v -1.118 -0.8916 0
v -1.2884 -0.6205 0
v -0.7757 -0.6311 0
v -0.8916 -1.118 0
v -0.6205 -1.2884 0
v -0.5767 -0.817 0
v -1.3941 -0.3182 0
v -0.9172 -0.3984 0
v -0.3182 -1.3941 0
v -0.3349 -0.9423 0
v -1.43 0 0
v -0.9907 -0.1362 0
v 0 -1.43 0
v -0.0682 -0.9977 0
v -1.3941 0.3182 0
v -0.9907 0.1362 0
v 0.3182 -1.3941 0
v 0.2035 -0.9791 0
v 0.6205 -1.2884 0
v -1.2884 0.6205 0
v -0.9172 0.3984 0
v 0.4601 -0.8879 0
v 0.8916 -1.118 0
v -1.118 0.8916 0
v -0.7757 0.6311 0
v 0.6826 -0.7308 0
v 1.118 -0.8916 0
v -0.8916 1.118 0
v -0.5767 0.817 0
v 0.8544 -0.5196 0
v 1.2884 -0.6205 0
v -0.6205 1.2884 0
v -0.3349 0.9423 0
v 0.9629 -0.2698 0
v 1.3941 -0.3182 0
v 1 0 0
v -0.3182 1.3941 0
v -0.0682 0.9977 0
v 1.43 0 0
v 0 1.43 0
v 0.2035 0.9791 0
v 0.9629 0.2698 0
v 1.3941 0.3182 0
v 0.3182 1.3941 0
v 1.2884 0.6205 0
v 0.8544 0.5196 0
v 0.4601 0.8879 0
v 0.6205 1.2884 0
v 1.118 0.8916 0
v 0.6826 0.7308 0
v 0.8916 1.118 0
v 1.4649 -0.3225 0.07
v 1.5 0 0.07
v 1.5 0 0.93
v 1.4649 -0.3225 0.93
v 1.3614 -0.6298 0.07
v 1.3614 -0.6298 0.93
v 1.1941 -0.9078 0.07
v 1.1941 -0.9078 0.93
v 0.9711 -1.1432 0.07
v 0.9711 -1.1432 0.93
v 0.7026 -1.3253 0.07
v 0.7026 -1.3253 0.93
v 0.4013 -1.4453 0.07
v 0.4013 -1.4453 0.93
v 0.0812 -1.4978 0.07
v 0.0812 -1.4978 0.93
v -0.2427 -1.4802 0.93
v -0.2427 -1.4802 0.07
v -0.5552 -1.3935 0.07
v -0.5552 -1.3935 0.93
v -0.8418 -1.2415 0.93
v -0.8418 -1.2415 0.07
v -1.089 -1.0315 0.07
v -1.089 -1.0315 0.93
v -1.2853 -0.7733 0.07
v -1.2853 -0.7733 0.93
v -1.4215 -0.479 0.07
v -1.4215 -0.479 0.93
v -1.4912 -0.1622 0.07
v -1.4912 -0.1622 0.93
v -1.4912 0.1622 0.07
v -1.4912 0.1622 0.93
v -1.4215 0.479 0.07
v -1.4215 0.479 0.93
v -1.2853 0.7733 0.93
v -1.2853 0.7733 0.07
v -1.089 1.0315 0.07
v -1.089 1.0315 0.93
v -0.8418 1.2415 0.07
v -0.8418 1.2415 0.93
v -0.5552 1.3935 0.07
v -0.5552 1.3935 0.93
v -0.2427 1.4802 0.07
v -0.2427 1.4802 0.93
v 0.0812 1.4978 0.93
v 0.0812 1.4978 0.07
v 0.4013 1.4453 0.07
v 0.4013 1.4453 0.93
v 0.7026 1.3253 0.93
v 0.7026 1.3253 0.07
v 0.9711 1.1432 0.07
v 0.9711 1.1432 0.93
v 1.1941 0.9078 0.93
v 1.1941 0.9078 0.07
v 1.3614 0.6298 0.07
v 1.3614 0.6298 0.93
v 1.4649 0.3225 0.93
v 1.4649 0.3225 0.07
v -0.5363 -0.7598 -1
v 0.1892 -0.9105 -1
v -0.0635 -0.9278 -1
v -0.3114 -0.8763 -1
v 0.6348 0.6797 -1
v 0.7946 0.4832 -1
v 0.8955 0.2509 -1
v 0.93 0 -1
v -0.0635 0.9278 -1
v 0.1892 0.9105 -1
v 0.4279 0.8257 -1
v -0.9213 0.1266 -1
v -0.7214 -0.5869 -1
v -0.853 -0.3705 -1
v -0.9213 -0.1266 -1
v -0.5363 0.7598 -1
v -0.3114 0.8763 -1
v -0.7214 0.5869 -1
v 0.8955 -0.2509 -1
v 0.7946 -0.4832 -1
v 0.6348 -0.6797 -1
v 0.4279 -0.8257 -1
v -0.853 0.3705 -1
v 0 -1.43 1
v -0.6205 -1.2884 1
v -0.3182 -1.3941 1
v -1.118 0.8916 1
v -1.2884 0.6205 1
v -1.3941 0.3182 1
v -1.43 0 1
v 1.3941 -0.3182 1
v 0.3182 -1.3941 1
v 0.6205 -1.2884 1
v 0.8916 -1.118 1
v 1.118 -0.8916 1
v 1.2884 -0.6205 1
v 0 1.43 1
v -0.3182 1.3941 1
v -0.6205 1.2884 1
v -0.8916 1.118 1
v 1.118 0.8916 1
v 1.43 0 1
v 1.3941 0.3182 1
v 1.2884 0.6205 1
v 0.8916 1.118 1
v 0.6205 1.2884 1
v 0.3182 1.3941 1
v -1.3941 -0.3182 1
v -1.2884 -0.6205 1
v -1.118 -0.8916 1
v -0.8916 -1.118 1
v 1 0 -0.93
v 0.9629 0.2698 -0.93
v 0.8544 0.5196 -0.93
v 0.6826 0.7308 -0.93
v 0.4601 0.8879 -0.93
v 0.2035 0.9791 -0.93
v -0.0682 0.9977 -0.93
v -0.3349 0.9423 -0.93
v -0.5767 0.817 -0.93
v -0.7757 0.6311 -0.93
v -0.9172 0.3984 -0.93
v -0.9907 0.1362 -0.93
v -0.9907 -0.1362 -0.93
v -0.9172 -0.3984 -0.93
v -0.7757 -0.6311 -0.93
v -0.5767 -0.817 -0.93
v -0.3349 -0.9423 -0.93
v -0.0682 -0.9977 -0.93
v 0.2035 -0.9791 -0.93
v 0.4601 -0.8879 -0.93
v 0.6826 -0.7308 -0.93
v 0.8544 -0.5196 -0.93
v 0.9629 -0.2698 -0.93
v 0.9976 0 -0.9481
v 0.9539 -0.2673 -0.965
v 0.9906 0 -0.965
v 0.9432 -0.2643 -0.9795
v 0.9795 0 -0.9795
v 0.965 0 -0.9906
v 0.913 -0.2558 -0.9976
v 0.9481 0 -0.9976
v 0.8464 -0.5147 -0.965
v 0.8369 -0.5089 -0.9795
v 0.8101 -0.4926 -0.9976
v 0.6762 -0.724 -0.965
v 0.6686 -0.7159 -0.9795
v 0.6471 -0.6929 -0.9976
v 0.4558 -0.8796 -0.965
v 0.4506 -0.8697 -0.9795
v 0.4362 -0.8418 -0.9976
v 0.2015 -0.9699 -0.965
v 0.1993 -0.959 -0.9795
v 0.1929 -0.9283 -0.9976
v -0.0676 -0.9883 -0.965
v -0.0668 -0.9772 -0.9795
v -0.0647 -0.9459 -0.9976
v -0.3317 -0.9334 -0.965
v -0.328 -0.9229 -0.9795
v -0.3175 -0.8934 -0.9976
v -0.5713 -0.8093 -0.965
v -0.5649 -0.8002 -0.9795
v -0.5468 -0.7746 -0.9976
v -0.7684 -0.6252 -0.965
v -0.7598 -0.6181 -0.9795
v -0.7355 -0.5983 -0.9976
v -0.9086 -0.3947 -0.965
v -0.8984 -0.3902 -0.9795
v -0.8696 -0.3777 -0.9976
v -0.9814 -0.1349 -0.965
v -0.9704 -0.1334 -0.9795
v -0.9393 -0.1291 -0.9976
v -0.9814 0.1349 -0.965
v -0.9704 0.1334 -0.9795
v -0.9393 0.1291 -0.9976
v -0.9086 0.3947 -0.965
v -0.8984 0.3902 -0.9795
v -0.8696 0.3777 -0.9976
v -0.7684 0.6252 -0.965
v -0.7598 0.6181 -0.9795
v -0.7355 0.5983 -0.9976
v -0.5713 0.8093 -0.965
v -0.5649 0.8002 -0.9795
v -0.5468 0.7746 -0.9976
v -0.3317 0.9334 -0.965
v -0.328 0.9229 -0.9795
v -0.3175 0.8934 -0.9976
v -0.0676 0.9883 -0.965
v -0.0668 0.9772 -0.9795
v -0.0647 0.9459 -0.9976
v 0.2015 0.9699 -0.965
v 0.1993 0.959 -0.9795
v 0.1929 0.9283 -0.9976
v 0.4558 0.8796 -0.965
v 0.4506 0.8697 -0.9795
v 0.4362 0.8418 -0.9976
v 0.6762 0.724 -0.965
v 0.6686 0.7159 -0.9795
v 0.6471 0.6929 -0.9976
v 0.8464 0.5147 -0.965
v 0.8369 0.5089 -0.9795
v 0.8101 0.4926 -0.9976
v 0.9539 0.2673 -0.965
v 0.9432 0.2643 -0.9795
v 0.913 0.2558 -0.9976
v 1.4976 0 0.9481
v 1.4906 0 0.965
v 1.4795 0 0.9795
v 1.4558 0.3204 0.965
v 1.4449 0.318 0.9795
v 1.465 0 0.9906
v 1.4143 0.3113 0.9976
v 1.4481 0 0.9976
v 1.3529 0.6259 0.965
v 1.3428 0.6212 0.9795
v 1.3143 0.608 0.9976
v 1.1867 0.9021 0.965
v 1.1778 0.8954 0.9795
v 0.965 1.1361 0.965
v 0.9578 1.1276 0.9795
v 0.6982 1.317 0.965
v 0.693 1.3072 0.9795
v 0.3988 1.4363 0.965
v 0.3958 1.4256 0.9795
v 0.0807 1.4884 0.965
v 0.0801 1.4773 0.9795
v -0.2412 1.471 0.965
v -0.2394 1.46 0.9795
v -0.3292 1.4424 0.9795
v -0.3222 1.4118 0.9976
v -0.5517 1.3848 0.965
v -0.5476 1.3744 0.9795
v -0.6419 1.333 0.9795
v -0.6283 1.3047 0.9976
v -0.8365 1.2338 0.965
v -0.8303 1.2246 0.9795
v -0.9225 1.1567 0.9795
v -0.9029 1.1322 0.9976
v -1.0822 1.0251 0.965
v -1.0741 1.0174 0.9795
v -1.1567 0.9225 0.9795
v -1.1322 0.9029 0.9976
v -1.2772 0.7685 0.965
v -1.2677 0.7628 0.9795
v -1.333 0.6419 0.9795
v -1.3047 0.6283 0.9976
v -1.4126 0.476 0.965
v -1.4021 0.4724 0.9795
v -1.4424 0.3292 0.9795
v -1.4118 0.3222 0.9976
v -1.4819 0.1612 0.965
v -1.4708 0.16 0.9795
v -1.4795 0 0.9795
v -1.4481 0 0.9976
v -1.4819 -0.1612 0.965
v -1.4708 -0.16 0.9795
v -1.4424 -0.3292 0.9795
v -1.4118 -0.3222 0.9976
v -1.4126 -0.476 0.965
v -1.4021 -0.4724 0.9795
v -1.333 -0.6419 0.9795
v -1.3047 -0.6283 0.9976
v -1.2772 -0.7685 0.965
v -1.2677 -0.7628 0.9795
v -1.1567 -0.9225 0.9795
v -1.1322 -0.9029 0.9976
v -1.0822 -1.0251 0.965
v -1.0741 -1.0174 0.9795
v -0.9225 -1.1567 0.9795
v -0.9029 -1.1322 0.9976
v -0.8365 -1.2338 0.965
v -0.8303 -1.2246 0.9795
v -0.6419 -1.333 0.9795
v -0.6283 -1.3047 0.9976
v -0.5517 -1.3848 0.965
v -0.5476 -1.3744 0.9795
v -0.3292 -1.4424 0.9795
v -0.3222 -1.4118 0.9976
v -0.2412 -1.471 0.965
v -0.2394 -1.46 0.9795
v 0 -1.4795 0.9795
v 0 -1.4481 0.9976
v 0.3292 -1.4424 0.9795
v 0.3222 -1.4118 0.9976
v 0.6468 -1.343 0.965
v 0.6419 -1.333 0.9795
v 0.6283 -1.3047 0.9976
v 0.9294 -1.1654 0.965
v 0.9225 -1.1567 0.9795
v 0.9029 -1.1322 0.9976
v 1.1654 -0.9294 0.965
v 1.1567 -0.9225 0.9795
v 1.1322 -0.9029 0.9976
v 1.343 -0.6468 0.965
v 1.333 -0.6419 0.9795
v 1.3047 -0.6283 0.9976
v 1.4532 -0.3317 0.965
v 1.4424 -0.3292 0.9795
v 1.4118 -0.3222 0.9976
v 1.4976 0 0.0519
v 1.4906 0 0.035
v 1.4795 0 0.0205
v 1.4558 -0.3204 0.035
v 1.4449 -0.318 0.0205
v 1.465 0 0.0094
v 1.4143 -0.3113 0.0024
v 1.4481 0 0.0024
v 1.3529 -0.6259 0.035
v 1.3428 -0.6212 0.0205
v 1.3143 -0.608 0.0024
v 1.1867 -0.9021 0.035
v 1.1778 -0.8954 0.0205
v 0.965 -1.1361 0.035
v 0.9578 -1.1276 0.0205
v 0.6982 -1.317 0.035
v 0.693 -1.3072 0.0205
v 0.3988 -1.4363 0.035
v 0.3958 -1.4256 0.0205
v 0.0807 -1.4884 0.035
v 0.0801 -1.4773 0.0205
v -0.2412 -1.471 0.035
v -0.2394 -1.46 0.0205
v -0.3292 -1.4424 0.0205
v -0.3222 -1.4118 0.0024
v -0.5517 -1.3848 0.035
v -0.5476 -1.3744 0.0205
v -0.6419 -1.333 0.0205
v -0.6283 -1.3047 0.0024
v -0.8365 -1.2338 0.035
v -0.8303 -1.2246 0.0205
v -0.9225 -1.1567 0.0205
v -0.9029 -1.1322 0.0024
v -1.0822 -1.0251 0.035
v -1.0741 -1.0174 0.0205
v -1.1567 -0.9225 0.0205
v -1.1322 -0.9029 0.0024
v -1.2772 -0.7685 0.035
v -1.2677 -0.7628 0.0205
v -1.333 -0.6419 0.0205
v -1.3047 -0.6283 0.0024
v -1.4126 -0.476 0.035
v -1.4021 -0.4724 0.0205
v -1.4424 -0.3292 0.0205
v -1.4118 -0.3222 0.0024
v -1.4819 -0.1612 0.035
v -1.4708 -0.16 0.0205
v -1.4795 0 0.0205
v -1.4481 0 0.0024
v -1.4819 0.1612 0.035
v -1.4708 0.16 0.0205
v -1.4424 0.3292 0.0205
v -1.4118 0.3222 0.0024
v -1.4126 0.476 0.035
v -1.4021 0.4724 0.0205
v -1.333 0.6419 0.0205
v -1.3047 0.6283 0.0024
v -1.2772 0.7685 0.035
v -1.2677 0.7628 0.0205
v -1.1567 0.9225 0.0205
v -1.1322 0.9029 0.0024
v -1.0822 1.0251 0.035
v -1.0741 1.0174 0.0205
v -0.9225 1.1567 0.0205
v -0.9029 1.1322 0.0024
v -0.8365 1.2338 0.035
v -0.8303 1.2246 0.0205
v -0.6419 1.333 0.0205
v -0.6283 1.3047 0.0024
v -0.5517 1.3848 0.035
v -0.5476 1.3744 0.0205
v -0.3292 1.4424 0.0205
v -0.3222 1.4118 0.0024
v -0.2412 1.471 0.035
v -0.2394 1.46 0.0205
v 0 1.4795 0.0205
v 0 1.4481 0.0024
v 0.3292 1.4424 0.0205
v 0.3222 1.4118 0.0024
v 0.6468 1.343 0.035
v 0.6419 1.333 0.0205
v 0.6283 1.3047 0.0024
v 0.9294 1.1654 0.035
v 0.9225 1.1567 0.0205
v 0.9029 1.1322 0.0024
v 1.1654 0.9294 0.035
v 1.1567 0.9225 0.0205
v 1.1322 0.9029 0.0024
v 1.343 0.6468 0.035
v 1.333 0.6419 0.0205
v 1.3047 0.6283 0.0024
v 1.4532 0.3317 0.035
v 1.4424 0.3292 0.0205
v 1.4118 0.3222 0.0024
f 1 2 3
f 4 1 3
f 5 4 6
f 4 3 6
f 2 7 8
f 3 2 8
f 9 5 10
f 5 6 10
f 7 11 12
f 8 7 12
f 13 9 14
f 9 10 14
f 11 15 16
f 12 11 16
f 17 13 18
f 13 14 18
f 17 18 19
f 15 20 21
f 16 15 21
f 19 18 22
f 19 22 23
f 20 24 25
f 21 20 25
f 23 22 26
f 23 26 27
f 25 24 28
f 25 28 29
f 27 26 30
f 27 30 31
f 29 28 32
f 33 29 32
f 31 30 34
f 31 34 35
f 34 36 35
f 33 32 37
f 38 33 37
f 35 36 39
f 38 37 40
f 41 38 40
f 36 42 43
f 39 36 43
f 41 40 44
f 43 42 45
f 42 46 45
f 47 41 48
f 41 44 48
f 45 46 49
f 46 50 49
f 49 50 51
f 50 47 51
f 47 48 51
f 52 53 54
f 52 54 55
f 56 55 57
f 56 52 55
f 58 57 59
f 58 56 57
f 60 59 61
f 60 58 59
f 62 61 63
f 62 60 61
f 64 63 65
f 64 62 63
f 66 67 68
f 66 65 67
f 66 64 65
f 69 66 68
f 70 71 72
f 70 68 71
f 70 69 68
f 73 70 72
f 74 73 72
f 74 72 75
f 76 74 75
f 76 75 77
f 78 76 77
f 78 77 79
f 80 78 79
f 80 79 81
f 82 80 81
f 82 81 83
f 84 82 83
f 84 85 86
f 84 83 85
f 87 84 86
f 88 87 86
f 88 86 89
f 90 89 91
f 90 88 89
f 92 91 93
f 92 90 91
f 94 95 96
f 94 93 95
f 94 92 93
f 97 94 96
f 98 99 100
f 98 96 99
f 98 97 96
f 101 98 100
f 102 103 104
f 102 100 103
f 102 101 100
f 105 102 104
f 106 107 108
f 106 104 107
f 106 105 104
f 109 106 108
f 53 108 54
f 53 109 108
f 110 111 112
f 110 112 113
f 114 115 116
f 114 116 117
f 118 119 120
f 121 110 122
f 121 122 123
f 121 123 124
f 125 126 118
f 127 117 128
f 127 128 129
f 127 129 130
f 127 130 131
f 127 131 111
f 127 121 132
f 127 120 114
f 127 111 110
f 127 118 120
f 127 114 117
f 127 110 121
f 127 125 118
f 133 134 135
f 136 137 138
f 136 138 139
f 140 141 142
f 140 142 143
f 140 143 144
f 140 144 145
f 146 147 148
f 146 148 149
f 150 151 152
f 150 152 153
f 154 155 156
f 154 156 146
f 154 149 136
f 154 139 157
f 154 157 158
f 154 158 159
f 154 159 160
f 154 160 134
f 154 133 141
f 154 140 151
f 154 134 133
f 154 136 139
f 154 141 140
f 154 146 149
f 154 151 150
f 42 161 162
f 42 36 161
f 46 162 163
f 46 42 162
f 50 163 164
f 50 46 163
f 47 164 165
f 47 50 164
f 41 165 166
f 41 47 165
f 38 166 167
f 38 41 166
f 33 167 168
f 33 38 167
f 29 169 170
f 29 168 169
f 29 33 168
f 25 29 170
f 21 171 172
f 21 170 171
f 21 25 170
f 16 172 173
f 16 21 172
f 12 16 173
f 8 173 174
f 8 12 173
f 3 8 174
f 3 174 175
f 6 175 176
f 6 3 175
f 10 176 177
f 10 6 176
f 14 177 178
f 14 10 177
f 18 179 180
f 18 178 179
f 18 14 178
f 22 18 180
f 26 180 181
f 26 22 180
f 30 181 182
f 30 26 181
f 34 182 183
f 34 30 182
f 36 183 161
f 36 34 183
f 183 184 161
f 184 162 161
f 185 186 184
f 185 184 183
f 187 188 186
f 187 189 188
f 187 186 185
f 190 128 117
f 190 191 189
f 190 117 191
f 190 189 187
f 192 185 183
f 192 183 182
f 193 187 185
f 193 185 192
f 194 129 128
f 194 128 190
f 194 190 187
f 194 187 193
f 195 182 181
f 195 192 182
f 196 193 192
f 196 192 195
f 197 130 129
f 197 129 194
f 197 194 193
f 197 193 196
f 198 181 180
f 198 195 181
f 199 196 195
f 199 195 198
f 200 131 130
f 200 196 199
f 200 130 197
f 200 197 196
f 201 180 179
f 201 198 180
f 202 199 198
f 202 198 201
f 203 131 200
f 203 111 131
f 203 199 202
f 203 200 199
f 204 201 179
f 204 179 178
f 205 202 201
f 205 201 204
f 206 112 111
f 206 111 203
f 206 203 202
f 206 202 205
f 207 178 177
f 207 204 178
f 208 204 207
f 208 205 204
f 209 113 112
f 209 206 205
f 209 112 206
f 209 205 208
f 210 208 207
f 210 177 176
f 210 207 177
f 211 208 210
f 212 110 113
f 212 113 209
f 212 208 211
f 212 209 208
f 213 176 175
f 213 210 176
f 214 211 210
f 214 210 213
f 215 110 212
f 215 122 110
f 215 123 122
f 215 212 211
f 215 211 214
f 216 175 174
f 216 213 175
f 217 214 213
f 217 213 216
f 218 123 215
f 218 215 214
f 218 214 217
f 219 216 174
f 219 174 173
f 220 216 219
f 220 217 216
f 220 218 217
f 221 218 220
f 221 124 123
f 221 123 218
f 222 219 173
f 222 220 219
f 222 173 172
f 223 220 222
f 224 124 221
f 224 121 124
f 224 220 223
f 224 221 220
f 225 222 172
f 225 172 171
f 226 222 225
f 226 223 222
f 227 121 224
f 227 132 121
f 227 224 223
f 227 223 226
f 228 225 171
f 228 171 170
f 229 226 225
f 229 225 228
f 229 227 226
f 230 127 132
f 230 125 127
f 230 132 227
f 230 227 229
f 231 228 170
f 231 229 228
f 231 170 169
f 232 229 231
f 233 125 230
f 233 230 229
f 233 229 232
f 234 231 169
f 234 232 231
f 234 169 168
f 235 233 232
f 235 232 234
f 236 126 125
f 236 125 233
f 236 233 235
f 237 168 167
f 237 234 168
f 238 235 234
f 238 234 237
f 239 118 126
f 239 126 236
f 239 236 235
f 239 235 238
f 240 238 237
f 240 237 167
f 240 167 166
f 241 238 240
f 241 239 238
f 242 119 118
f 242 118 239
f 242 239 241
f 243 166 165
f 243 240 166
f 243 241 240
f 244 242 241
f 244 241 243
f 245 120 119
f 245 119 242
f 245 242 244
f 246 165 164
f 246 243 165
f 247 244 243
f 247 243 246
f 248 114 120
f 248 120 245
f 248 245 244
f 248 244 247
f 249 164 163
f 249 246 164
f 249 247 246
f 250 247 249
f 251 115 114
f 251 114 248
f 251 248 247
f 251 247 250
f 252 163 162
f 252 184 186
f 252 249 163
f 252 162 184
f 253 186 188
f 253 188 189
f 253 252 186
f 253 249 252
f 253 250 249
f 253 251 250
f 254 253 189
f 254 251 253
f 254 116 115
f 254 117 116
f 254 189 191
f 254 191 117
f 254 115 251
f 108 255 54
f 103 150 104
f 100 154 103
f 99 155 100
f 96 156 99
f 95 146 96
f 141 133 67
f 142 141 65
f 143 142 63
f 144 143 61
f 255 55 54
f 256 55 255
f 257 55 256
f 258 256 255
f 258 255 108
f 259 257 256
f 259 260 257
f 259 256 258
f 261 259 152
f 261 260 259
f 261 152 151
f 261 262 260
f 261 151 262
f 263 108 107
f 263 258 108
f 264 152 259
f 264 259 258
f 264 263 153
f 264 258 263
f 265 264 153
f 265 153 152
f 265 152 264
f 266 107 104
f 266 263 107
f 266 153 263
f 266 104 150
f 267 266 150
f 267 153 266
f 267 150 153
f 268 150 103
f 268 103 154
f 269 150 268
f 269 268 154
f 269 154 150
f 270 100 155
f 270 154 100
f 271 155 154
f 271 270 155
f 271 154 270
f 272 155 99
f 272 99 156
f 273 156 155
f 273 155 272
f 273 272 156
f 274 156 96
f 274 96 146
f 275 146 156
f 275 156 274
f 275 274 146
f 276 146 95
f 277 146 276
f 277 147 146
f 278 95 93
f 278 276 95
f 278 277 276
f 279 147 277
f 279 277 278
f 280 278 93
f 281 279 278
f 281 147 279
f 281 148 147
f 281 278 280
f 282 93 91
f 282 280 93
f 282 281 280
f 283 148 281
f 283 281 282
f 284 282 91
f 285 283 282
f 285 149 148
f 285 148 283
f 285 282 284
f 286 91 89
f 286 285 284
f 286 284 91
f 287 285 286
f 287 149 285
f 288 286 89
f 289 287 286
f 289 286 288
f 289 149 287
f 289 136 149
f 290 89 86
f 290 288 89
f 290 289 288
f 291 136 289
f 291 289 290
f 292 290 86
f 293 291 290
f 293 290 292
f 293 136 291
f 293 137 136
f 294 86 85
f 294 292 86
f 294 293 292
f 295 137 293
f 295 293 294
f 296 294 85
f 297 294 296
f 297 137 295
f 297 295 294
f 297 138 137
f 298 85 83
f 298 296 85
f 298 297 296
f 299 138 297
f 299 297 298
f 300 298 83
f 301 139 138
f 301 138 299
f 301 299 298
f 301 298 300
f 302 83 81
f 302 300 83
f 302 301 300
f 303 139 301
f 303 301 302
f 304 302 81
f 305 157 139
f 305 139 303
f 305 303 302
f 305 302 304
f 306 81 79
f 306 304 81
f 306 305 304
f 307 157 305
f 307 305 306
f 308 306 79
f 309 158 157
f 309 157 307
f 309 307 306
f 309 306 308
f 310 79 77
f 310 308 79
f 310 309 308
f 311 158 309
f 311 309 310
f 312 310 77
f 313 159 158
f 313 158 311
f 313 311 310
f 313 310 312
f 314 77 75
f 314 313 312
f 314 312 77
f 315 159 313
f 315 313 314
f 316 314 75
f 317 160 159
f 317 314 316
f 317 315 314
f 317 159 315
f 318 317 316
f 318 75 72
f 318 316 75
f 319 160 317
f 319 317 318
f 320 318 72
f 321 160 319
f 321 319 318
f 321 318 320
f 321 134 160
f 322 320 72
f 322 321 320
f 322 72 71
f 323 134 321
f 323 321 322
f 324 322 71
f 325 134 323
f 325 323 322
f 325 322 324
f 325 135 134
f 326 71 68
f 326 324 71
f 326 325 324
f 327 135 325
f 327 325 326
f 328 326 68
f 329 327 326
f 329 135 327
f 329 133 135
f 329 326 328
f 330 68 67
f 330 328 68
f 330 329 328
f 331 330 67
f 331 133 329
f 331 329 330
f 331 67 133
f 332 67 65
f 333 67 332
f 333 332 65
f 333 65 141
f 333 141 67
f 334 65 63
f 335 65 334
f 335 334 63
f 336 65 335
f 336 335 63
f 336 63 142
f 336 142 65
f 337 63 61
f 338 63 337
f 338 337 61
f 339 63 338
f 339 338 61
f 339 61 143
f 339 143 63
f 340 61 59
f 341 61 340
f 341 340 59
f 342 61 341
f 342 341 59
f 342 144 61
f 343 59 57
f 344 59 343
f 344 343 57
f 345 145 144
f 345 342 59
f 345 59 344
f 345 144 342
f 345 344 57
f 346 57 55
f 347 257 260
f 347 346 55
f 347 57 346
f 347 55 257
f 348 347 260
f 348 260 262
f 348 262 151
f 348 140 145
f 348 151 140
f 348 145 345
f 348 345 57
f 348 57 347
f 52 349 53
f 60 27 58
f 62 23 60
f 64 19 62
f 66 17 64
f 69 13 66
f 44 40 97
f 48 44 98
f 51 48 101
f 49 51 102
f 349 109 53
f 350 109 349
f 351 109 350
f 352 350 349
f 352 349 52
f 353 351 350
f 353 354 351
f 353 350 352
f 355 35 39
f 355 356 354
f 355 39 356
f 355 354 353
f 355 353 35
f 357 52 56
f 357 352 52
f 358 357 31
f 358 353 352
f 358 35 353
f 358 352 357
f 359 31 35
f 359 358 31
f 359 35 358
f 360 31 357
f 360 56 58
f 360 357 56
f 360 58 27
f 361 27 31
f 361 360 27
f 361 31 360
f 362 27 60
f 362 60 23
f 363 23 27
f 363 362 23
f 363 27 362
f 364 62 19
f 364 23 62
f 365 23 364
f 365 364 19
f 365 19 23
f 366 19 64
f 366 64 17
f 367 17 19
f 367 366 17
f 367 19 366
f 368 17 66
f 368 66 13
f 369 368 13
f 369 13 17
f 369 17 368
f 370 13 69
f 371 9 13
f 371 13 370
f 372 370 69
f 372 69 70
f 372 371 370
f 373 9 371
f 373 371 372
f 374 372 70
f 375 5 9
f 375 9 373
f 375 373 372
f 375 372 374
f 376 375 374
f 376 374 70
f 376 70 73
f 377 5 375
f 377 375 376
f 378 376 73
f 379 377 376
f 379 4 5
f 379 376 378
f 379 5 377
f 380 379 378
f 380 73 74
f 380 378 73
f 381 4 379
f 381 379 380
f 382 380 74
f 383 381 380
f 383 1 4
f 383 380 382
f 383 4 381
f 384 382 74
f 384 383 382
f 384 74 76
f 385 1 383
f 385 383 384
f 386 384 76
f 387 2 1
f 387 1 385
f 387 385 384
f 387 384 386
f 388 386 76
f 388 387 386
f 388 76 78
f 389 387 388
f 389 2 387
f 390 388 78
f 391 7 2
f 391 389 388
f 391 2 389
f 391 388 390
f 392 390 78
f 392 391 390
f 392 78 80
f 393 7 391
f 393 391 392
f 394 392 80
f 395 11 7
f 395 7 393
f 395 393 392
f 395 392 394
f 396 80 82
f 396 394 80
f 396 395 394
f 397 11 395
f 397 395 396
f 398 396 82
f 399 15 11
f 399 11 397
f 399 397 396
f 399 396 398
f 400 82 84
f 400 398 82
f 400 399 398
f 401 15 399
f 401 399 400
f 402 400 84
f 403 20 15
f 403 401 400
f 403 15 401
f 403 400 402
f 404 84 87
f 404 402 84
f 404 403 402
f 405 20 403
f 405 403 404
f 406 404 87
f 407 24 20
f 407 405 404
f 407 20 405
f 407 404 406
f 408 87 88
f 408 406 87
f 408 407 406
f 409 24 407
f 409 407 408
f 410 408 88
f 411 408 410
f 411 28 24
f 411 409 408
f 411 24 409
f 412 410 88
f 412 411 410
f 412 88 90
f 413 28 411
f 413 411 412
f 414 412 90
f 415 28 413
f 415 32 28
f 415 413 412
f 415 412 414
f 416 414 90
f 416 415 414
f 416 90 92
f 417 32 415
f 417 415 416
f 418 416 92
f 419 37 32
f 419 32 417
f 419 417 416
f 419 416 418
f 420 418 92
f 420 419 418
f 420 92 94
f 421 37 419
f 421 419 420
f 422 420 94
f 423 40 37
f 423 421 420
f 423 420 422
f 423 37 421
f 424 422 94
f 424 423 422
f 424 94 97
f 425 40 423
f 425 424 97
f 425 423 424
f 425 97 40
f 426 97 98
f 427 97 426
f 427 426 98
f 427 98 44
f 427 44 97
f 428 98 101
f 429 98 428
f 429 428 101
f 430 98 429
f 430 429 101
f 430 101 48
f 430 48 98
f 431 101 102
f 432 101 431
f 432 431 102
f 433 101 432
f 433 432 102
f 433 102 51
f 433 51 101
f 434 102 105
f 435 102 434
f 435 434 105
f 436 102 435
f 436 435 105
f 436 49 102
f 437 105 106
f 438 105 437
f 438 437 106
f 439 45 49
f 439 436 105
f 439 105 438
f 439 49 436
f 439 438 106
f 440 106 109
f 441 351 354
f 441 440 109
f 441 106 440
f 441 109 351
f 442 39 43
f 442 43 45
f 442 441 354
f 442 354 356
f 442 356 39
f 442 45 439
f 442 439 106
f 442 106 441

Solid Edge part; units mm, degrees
sketch "Sketch1" plane through (0, 0, 0) normal (0, 0, 1) x (1, 0, 0)
  circle A0 centre (0, 0) radius 1.5
extrude "Protrusion1" add sketch "Sketch1" along normal blind 1
sketch "Sketch2" plane through (0, 0, 0) normal (0, 0, -1) x (1, 0, 0)
  circle A0 centre (0, 0) radius 1
extrude "ExtrudedProtrusion_2" add sketch "Sketch2" along normal blind 1
fillet "Round_1" radius 0.07 3 edges at (-1.5, 0, 1) (-1.5, 0, 0) (-1, 0, -1)
